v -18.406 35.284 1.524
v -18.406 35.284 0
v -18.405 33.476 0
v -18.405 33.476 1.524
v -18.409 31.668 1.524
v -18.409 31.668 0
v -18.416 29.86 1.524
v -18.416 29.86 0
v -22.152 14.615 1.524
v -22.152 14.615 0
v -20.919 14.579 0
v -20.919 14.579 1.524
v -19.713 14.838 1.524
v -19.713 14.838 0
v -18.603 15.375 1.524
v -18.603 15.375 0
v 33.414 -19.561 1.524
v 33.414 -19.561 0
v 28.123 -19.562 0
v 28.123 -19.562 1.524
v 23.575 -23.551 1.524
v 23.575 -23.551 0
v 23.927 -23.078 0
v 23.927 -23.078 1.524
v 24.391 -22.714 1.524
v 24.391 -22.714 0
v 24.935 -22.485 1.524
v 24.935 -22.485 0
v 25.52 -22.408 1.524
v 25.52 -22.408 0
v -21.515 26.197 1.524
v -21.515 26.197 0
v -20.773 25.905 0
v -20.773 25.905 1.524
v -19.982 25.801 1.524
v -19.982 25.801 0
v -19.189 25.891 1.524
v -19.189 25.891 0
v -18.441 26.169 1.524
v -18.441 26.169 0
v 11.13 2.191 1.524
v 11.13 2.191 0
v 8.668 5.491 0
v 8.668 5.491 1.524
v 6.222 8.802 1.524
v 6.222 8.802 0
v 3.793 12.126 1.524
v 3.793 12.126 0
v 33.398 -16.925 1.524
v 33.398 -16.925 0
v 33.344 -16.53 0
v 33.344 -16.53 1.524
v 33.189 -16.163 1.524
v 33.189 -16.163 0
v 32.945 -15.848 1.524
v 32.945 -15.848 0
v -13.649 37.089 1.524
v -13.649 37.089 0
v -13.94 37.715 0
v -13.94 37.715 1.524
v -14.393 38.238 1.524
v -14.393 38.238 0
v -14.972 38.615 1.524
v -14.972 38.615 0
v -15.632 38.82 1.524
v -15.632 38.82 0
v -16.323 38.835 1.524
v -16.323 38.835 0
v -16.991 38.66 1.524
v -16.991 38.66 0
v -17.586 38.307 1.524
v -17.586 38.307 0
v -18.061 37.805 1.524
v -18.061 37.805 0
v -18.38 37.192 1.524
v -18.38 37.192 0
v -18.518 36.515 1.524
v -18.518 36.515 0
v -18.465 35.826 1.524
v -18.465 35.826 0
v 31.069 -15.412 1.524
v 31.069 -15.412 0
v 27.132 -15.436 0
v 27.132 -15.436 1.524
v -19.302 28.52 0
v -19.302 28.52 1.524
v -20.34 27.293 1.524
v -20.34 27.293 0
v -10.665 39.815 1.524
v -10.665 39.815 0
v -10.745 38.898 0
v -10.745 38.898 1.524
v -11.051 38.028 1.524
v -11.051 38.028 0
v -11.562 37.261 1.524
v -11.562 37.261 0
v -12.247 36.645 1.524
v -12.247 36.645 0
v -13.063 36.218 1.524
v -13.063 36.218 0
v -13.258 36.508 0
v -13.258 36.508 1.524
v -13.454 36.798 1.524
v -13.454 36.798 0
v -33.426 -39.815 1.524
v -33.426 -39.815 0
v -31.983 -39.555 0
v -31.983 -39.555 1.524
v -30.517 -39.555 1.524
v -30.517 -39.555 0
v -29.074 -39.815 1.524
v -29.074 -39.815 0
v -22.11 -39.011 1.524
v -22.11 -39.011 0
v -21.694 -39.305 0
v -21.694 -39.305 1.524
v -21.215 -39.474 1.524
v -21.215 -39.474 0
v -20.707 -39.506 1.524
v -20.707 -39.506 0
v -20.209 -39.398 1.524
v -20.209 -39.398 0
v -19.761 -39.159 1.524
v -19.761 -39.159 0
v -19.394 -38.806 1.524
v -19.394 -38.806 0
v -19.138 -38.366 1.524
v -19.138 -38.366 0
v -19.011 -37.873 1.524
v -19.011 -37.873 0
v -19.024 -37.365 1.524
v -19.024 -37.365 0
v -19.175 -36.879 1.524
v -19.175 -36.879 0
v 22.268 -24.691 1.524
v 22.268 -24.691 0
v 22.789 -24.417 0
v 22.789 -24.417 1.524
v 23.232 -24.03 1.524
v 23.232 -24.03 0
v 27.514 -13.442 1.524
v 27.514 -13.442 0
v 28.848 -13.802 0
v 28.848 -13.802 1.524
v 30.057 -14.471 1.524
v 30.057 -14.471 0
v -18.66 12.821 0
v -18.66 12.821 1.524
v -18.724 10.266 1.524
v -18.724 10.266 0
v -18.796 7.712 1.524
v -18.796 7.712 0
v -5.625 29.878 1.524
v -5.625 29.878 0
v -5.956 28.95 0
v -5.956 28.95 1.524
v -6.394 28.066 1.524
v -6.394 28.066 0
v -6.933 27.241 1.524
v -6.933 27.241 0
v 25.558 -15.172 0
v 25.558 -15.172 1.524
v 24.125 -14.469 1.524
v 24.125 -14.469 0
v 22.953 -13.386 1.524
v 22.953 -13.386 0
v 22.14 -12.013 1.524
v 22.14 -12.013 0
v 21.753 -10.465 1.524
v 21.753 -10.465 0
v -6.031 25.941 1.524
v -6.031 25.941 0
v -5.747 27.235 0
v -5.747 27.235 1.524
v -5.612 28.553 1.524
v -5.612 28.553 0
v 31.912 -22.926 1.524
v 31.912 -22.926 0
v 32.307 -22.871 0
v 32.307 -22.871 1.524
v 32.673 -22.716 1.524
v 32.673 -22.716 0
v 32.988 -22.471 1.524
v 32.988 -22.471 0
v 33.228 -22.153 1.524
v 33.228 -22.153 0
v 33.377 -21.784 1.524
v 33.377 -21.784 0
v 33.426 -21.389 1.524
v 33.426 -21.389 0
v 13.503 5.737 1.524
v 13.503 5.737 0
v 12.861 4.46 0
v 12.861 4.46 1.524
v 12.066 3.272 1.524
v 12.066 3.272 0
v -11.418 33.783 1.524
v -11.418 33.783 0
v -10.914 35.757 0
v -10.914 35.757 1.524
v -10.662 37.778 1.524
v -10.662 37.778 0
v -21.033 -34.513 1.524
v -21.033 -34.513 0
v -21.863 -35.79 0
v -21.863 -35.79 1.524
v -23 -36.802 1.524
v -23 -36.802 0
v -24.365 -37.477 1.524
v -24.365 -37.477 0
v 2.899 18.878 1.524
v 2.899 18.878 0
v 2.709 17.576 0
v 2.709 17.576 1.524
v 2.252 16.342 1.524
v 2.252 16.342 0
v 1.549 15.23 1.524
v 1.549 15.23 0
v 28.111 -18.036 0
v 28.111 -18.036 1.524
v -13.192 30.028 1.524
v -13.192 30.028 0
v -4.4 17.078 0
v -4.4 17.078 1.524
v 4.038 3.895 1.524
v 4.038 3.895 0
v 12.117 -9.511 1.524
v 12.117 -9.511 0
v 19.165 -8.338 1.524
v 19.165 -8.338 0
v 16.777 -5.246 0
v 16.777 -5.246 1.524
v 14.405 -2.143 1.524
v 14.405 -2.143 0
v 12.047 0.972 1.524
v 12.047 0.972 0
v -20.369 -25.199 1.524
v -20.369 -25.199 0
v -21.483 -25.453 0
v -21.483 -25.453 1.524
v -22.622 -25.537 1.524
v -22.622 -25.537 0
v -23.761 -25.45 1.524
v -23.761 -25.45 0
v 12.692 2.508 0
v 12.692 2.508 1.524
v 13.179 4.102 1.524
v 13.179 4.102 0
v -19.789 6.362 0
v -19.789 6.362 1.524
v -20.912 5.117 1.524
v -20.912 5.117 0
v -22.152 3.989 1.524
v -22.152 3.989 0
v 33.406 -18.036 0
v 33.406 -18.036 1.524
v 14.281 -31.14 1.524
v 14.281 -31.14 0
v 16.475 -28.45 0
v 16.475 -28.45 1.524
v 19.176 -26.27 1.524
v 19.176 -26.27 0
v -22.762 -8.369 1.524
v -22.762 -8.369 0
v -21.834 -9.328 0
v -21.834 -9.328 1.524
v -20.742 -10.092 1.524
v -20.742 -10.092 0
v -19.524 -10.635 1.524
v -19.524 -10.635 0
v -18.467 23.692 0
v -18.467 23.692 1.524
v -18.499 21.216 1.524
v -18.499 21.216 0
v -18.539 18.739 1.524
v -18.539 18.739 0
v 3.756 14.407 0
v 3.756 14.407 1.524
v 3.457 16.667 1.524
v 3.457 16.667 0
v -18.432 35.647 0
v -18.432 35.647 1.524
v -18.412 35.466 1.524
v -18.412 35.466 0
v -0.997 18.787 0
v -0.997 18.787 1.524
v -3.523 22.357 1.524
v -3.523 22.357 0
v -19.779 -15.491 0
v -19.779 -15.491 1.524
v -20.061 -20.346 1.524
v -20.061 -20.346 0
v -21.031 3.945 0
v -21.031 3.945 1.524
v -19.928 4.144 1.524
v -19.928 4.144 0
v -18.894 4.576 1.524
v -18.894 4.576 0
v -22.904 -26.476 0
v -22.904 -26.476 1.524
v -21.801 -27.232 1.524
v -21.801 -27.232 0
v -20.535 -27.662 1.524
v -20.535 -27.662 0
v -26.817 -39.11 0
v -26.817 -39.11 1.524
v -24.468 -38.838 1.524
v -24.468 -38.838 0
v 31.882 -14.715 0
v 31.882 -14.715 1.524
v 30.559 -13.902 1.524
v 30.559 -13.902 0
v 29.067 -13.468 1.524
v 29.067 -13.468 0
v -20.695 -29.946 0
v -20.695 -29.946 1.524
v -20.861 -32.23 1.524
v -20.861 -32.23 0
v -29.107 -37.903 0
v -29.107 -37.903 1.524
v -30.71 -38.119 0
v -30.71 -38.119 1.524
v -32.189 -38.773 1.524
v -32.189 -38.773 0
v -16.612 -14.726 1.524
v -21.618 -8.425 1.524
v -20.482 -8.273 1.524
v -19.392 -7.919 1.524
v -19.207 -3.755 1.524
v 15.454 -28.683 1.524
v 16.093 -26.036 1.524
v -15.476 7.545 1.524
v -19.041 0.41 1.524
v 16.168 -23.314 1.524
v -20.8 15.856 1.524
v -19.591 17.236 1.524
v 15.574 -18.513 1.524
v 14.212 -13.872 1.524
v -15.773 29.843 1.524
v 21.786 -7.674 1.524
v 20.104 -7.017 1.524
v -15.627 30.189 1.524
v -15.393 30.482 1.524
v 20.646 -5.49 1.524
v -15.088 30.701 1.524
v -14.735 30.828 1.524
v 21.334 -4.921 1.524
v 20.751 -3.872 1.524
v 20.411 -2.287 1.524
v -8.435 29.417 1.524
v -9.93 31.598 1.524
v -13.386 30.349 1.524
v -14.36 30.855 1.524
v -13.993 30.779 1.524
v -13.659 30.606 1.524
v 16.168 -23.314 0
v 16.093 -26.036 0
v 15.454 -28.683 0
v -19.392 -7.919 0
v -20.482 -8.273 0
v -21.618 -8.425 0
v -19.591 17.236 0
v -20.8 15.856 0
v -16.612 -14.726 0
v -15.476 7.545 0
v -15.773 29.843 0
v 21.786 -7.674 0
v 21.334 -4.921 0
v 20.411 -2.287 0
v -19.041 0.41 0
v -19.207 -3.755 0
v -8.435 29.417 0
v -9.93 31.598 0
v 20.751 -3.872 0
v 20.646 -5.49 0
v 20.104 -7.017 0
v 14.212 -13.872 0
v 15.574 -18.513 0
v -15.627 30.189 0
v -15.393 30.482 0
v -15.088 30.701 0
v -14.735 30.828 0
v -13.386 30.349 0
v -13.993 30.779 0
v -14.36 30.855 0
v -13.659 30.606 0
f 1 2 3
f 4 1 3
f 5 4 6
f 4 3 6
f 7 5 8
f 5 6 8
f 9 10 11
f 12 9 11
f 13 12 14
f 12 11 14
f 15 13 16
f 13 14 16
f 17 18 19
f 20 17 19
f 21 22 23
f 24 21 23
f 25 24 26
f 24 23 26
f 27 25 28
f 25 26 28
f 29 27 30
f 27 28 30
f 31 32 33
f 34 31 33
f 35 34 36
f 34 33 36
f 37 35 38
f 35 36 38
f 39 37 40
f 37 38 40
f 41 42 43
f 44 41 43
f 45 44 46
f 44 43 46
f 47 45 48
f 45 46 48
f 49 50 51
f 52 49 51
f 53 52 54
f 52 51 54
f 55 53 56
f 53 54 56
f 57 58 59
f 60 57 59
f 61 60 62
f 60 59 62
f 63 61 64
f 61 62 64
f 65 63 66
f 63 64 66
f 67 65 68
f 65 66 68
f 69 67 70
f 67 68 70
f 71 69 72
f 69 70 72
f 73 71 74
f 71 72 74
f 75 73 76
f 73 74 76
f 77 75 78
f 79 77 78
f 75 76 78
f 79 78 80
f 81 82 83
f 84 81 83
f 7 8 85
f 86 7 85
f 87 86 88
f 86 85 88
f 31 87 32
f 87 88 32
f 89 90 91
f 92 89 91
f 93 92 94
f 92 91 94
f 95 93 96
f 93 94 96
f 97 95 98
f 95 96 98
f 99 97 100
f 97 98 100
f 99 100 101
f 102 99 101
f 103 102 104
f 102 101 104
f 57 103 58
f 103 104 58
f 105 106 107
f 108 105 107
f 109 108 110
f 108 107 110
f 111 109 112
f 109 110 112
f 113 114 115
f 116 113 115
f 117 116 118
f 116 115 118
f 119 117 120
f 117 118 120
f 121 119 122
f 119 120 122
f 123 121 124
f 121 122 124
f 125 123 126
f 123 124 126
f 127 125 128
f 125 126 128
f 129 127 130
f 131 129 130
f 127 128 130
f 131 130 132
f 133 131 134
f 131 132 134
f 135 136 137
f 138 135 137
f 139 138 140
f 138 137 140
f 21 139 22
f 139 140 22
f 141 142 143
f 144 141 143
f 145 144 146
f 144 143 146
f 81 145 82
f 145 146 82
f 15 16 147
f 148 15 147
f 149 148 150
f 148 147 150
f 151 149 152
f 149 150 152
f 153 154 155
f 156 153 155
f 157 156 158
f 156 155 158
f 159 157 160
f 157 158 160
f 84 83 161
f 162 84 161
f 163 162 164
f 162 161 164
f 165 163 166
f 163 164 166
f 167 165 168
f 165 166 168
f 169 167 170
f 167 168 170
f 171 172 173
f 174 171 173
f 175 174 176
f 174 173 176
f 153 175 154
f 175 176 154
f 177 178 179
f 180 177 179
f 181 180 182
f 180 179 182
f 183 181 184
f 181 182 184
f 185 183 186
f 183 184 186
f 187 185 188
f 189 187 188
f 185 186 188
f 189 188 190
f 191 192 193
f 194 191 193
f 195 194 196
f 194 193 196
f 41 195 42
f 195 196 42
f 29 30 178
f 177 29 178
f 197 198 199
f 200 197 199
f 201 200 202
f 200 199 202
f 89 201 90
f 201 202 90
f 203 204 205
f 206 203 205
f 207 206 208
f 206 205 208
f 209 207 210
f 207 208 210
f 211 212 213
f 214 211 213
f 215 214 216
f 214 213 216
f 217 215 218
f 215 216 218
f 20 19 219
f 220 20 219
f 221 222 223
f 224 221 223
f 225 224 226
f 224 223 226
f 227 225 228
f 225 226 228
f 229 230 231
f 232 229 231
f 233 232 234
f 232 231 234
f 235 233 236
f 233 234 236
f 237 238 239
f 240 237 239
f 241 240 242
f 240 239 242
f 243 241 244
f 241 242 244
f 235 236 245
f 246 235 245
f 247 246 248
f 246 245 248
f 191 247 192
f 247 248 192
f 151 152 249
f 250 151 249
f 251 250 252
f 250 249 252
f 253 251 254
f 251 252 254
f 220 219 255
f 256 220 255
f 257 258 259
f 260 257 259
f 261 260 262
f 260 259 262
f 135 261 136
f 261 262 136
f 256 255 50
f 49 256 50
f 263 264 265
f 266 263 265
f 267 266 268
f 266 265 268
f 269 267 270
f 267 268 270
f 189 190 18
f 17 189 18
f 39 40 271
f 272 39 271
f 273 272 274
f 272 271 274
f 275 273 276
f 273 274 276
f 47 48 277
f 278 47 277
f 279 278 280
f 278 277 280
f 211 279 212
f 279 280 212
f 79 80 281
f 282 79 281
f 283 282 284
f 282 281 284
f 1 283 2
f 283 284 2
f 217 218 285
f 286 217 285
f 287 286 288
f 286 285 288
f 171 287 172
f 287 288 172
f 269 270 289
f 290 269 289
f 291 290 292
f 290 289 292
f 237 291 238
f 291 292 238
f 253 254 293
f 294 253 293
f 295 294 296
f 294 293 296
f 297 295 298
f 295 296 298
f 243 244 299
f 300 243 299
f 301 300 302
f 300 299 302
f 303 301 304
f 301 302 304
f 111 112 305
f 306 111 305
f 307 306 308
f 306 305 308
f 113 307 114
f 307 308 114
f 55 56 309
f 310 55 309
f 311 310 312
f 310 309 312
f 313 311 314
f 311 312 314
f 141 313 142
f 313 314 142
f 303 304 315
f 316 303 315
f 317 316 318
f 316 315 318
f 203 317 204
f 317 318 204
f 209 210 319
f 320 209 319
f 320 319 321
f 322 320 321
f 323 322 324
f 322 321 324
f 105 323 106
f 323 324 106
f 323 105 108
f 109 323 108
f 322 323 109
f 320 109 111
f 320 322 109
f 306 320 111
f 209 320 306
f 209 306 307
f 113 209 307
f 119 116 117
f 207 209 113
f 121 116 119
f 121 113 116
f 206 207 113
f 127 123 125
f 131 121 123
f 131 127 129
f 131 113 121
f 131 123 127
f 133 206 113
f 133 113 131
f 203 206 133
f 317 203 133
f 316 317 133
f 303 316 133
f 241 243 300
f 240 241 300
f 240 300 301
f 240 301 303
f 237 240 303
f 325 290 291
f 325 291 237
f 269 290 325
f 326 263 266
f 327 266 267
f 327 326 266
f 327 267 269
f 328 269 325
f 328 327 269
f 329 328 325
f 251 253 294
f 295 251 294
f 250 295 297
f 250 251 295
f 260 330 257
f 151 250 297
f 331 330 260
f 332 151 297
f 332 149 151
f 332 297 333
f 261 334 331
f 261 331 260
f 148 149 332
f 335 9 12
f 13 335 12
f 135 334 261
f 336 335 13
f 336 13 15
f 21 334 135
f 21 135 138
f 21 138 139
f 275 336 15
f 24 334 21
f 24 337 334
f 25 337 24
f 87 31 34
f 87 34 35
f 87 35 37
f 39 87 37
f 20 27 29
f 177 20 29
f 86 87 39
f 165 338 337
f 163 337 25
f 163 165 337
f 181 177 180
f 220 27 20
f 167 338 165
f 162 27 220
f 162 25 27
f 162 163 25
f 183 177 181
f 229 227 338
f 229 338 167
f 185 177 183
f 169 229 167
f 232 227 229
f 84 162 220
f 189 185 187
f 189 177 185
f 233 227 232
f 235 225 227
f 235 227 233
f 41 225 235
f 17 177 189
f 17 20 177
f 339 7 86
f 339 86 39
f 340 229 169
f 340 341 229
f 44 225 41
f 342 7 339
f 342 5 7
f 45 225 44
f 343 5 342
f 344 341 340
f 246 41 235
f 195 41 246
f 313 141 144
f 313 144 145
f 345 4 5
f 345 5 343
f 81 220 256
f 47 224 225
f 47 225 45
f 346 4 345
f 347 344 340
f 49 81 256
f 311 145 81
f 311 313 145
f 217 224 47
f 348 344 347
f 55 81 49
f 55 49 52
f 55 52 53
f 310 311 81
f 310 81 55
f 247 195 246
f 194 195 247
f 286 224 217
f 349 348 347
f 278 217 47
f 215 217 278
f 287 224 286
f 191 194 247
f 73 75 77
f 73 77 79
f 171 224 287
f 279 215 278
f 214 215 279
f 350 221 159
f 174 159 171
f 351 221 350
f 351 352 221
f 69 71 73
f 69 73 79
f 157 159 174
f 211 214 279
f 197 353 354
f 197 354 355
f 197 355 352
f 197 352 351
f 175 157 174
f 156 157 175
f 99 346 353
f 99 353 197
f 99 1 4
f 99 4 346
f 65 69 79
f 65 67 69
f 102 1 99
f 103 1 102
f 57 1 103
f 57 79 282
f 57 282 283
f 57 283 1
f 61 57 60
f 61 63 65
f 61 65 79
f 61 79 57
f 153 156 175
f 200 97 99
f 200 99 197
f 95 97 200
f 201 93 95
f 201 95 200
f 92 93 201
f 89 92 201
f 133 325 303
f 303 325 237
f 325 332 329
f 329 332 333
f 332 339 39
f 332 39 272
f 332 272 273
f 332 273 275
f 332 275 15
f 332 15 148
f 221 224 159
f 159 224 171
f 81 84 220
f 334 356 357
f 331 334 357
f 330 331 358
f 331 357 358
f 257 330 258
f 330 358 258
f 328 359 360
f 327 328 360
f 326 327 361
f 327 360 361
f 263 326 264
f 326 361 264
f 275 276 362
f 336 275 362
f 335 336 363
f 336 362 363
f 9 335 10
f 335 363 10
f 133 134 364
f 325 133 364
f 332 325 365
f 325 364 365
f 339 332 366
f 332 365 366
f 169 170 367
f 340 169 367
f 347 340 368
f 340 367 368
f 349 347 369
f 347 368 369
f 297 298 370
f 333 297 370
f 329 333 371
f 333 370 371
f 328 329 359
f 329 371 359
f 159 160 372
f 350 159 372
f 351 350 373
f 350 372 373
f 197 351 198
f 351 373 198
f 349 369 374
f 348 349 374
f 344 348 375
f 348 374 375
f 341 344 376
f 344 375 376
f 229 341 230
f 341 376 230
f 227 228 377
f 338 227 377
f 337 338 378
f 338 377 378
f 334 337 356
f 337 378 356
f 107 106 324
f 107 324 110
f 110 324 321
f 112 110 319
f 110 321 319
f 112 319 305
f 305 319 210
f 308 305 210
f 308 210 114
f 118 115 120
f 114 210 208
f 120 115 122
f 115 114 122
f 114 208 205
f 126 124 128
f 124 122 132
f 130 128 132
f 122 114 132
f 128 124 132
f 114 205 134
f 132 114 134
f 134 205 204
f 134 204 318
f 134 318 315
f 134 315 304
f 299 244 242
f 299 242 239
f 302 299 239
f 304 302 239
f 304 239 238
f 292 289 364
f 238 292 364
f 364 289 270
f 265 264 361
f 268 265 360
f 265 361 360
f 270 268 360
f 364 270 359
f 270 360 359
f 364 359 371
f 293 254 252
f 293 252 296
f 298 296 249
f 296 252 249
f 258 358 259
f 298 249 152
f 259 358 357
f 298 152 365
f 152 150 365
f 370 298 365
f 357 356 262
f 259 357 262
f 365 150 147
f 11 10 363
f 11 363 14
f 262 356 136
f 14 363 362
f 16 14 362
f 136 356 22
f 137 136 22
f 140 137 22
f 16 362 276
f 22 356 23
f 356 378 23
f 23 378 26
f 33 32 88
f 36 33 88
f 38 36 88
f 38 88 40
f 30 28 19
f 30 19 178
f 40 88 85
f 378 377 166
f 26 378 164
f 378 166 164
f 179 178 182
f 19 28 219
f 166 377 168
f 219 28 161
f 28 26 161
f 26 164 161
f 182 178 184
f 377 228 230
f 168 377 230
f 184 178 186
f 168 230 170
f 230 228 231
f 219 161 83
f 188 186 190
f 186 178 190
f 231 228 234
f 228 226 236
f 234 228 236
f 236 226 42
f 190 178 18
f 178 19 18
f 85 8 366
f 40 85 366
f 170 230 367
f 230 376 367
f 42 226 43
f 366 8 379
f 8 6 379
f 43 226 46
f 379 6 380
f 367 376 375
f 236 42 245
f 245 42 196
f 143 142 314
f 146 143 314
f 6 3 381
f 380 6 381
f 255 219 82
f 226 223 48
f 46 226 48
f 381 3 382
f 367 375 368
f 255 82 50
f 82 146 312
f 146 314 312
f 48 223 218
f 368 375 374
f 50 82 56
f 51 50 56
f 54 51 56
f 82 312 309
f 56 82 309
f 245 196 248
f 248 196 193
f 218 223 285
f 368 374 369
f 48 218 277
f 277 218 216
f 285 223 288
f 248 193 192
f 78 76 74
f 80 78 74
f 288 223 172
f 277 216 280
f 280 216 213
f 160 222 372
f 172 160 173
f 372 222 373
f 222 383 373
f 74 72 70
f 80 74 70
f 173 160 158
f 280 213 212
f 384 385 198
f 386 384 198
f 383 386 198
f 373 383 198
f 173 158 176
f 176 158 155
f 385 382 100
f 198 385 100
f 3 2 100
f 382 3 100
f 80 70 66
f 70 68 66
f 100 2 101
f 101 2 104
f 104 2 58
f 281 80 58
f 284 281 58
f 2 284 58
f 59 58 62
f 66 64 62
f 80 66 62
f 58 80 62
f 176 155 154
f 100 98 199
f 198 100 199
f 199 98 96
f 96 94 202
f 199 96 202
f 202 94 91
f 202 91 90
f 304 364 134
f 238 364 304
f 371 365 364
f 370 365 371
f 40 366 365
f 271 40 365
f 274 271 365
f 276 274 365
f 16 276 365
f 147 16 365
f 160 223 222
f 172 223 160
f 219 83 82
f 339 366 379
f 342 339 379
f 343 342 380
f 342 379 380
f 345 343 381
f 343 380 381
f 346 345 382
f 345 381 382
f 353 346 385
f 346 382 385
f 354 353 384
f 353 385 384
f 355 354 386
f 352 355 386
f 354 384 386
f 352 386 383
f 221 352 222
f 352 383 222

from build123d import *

# Parameters (mm, degrees)
BOSS_EXTRUDE1_DEPTH = 1.524


with BuildPart() as part:
    # Sketch1 → Boss-Extrude1 (new body)
    with BuildSketch(Plane.XY):
        with BuildLine():
            Line((-24.364554891, -37.477178577), (-29.107446573, -37.903411516))
            ThreePointArc((-29.107446573, -37.903411516), (-31.473071099, -38.393425652), (-33.42606857, -39.815429216))
            ThreePointArc((-33.42606857, -39.815429216), (-31.249893388, -39.522353453), (-29.073637755, -39.814831212))
            ThreePointArc((-29.073637755, -39.814831212), (-25.648712592, -38.918813581), (-22.109711099, -39.010619897))
            ThreePointArc((-22.109711099, -39.010619897), (-19.760509062, -39.158760526), (-19.17540942, -36.878770555))
            ThreePointArc((-19.17540942, -36.878770555), (-15.865162798, -3.599783912), (-15.772880419, 29.843304591))
            ThreePointArc((-15.772880419, 29.843304591), (-14.548235849, 30.854621423), (-13.192137962, 30.027872017))
            ThreePointArc((-13.192137962, 30.027872017), (-0.136306851, 10.515149008), (12.117439823, -9.511003335))
            ThreePointArc((12.117439823, -9.511003335), (14.987237528, -16.164940717), (16.168465676, -23.314438715))
            ThreePointArc((16.168465676, -23.314438715), (15.842573186, -27.376128515), (14.280506414, -31.139568078))
            ThreePointArc((14.280506414, -31.139568078), (17.769072475, -27.290062934), (22.267530319, -24.691474848))
            ThreePointArc((22.267530319, -24.691474848), (23.021800675, -24.236514222), (23.57532619, -23.551297143))
            ThreePointArc((23.57532619, -23.551297143), (24.39123878, -22.713681417), (25.519929239, -22.408114227))
            Line((25.519929239, -22.408114227), (31.91215665, -22.925682288))
            ThreePointArc((31.91215665, -22.925682288), (32.987506925, -22.470894628), (33.426022068, -21.3888066))
            Line((33.426022068, -21.3888066), (33.414100594, -19.560808287))
            Line((33.414100594, -19.560808287), (28.122840134, -19.561801701))
            Line((28.122840134, -19.561801701), (28.110918151, -18.035820501))
            Line((28.110918151, -18.035820501), (33.406152775, -18.035820501))
            Line((33.406152775, -18.035820501), (33.398174437, -16.925455032))
            ThreePointArc((33.398174437, -16.925455032), (33.278622124, -16.341687991), (32.944745486, -15.848126338))
            ThreePointArc((32.944745486, -15.848126338), (30.558622948, -13.902263693), (27.514270045, -13.441962054))
            ThreePointArc((27.514270045, -13.441962054), (29.473047609, -14.099689708), (31.069176316, -15.411859044))
            Line((31.069176316, -15.411859044), (27.131733148, -15.435585668))
            ThreePointArc((27.131733148, -15.435585668), (23.499650774, -13.970182339), (21.752807973, -10.464762321))
            ThreePointArc((21.752807973, -10.464762321), (21.619864509, -6.287804949), (20.411069114, -2.287372404))
            ThreePointArc((20.411069114, -2.287372404), (20.646164492, -5.489635666), (19.164832874, -8.338392672))
            ThreePointArc((19.164832874, -8.338392672), (15.589025091, -3.695796166), (12.046655257, 0.972364027))
            ThreePointArc((12.046655257, 0.972364027), (12.956062916, 3.299009299), (13.502748407, 5.736515296))
            ThreePointArc((13.502748407, 5.736515296), (12.481630447, 3.853470902), (11.130205062, 2.191487897))
            ThreePointArc((11.130205062, 2.191487897), (7.442893614, 7.145097778), (3.793181539, 12.12647493))
            ThreePointArc((3.793181539, 12.12647493), (3.6391771, 15.54128121), (2.898904085, 18.878437958))
            ThreePointArc((2.898904085, 18.878437958), (2.513226677, 16.946929667), (1.548714149, 15.229609975))
            ThreePointArc((1.548714149, 15.229609975), (-2.262432259, 20.570077326), (-6.030509674, 25.941019614))
            ThreePointArc((-6.030509674, 25.941019614), (-5.660787122, 27.892481118), (-5.62524637, 29.878339526))
            ThreePointArc((-5.62524637, 29.878339526), (-6.161870131, 28.501450031), (-6.932604962, 27.240594145))
            ThreePointArc((-6.932604962, 27.240594145), (-9.183193775, 30.506482698), (-11.417879239, 33.783273646))
            ThreePointArc((-11.417879239, 33.783273646), (-10.755972391, 36.763721595), (-10.665026003, 39.815429216))
            ThreePointArc((-10.665026003, 39.815429216), (-11.282248363, 37.628788529), (-13.063123372, 36.21781541))
            ThreePointArc((-13.063123372, 36.21781541), (-13.355981093, 36.653158865), (-13.648558784, 37.088690566))
            ThreePointArc((-13.648558784, 37.088690566), (-16.663200217, 38.770611805), (-18.464850886, 35.825959552))
            ThreePointArc((-18.464850886, 35.825959552), (-18.420691896, 35.556546257), (-18.405703646, 35.283949682))
            ThreePointArc((-18.405703646, 35.283949682), (-18.40664027, 32.572114189), (-18.415743017, 29.860293811))
            ThreePointArc((-18.415743017, 29.860293811), (-19.802823987, 27.891016102), (-21.515118511, 26.1968804))
            ThreePointArc((-21.515118511, 26.1968804), (-19.981611623, 25.800865516), (-18.441254033, 26.16933486))
            ThreePointArc((-18.441254033, 26.16933486), (-18.482213638, 22.453964053), (-18.538502103, 18.738793864))
            ThreePointArc((-18.538502103, 18.738793864), (-20.176761137, 16.529345851), (-22.151609818, 14.614789539))
            ThreePointArc((-22.151609818, 14.614789539), (-20.30809135, 14.67247237), (-18.602694106, 15.374973539))
            ThreePointArc((-18.602694106, 15.374973539), (-18.691127928, 11.543467884), (-18.795866803, 7.712373276))
            ThreePointArc((-18.795866803, 7.712373276), (-20.334999659, 5.725783654), (-22.151609818, 3.989294148))
            ThreePointArc((-22.151609818, 3.989294148), (-20.47435397, 4.014209715), (-18.893763009, 4.575939347))
            ThreePointArc((-18.893763009, 4.575939347), (-19.121395234, -1.672175675), (-19.392400358, -7.918559748))
            ThreePointArc((-19.392400358, -7.918559748), (-21.046264617, -8.374679978), (-22.761865121, -8.369430126))
            ThreePointArc((-22.761865121, -8.369430126), (-21.306272714, -9.735931232), (-19.523833936, -10.635368018))
            ThreePointArc((-19.523833936, -10.635368018), (-19.916786026, -17.918683373), (-20.36871487, -25.198577206))
            ThreePointArc((-20.36871487, -25.198577206), (-22.05068144, -25.516497621), (-23.761121477, -25.44956621))
            ThreePointArc((-23.761121477, -25.44956621), (-22.378228066, -26.891420245), (-20.535063915, -27.662188146))
            ThreePointArc((-20.535063915, -27.662188146), (-20.777686634, -31.088285528), (-21.033374555, -34.513432641))
            ThreePointArc((-21.033374555, -34.513432641), (-22.397678986, -36.333943653), (-24.364554891, -37.477178577))
        make_face()
    extrude(amount=BOSS_EXTRUDE1_DEPTH)


solid = part.part
